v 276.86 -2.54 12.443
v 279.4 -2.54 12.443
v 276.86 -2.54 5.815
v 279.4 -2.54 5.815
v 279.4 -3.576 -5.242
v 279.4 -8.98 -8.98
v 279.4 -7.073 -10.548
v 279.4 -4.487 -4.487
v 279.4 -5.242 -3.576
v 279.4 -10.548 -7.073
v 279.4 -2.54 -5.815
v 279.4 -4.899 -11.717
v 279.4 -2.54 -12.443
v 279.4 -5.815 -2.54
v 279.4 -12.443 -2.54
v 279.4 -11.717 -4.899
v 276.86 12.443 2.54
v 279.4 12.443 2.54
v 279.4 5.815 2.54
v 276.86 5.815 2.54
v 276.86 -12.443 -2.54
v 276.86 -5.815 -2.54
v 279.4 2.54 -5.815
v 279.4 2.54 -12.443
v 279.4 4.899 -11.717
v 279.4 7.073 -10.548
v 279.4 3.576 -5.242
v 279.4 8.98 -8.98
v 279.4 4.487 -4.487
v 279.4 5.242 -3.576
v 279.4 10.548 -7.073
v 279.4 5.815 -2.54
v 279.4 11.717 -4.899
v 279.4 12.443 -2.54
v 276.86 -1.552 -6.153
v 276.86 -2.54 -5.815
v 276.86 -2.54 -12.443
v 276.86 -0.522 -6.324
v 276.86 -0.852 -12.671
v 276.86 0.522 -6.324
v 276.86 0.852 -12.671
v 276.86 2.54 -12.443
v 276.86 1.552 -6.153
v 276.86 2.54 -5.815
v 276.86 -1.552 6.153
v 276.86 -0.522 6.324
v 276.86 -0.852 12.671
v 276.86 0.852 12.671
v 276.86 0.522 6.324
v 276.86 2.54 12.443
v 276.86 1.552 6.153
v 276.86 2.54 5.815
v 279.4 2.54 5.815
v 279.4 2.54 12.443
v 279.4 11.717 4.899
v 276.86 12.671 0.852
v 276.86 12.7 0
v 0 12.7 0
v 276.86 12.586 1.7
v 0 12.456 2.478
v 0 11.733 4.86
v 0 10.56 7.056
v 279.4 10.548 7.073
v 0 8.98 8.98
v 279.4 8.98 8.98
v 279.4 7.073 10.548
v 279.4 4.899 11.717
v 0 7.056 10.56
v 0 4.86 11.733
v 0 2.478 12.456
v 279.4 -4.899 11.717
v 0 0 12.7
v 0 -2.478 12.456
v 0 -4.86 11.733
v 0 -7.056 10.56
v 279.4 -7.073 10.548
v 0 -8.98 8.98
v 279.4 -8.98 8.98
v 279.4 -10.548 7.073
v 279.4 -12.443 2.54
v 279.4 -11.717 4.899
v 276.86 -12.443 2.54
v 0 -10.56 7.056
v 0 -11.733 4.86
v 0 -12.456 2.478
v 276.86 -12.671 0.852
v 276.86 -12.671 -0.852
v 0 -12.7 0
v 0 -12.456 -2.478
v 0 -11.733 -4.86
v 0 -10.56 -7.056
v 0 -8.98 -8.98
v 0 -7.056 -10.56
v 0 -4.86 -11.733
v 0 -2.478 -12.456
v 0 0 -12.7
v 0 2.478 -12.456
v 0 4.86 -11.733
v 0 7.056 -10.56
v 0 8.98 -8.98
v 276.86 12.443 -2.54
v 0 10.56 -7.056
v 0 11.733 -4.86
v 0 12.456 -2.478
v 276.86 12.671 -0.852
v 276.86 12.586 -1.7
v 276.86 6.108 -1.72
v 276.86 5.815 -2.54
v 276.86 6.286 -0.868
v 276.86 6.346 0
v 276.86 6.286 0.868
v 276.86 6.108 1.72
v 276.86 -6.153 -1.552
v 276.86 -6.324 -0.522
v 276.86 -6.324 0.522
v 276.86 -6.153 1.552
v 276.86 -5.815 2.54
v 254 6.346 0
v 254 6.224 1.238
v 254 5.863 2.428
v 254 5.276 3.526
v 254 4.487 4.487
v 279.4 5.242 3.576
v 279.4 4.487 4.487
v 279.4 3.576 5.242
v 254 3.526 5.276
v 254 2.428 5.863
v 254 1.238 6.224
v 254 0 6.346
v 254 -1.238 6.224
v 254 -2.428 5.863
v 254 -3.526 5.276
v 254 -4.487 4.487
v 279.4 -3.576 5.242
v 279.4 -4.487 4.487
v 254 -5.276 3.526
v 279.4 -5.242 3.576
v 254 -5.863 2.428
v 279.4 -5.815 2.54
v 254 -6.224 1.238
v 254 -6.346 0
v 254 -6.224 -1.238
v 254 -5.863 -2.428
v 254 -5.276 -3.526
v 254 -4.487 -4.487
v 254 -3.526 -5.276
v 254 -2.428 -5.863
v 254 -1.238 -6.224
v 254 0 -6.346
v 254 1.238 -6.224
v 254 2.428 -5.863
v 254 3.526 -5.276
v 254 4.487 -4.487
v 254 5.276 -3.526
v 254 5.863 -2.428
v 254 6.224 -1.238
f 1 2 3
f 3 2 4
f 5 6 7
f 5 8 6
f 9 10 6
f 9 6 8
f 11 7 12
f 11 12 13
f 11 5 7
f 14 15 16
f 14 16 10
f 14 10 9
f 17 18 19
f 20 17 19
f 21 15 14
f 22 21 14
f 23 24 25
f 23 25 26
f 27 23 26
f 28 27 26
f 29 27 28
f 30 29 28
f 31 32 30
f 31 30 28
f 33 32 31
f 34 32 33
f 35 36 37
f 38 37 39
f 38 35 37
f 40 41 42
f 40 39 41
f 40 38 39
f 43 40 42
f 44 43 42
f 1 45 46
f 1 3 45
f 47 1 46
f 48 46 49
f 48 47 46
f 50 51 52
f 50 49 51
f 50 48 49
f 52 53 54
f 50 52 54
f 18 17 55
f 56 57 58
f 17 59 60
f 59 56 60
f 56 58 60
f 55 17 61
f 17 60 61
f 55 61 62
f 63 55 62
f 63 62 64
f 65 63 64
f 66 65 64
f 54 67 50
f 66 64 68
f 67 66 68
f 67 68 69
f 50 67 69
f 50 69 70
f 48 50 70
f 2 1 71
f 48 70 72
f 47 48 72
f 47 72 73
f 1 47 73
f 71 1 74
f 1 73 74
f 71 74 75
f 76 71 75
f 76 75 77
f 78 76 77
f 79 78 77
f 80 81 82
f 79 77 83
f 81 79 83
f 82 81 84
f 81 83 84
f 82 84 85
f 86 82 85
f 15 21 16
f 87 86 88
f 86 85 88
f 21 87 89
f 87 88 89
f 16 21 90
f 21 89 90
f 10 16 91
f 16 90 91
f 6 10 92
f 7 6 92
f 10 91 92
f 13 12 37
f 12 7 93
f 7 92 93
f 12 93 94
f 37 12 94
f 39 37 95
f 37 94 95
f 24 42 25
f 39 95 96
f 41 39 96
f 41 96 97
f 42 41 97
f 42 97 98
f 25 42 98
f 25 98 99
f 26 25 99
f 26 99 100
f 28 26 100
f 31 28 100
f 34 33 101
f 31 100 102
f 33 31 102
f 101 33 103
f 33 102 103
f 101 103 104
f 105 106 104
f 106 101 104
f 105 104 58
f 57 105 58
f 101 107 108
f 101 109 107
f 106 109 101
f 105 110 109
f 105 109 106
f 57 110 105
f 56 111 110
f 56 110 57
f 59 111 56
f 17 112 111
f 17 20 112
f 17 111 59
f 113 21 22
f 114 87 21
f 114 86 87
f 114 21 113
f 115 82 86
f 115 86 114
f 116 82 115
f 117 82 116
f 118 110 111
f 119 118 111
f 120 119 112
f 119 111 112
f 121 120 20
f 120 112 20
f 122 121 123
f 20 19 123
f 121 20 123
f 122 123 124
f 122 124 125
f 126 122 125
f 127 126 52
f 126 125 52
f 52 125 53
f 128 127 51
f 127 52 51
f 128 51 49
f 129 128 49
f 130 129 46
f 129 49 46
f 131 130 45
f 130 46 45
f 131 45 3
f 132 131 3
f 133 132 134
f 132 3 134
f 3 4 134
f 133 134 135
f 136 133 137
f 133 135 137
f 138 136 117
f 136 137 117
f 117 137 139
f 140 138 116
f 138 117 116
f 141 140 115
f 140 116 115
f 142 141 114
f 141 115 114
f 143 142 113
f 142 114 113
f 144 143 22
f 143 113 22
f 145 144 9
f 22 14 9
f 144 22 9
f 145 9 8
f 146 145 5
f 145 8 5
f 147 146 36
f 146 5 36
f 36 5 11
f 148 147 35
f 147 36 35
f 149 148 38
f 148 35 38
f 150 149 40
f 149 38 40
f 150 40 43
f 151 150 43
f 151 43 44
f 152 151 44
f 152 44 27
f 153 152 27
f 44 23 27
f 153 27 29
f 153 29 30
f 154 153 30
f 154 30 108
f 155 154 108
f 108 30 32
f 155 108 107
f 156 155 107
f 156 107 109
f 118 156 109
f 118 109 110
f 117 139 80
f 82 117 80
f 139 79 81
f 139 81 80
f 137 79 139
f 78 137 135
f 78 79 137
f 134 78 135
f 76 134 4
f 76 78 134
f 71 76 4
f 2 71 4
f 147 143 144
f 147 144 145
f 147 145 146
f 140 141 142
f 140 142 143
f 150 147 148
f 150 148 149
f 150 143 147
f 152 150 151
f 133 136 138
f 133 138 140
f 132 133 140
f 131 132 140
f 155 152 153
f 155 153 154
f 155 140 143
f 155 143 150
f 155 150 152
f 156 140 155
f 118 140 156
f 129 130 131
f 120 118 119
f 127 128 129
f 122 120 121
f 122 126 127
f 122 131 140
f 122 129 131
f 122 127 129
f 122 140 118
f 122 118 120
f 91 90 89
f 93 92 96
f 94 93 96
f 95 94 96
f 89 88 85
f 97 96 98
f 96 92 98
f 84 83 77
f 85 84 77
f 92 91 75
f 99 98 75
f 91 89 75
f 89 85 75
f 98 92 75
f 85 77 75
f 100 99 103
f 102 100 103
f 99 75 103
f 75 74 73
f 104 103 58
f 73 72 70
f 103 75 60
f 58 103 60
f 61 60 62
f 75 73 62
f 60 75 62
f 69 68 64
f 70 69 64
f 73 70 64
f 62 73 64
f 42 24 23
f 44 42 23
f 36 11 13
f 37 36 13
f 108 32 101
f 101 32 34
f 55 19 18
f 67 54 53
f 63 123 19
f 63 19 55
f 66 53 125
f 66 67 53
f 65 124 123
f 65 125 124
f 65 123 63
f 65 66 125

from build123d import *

# Parameters (mm, degrees)
F0_R     = 12.7
F1_DEPTH = 279.4
F3_DEPTH = 2.54
F4_R     = 6.345743
F5_DEPTH = 25.4


with BuildPart() as f1:
    # F0 (on Right) → F1 (new body)
    with BuildSketch(Plane.YZ):
        Circle(F0_R)
    extrude(amount=F1_DEPTH)

    # F2 (on face) → F3 (cut)
    with BuildSketch(Plane.YZ.offset(279.4)):
        with BuildLine():
            Line((17.428713, 2.54), (12.443408, 2.54))
            ThreePointArc((12.443408, 2.54), (12.635689, 1.276464), (12.7, 0))
            ThreePointArc((12.7, 0), (12.635689, -1.276464), (12.443408, -2.54))
            Line((12.443408, -2.54), (17.428713, -2.54))
            Line((17.428713, -2.54), (17.428713, 2.54))
        make_face()
        with BuildLine():
            ThreePointArc((-2.54, 12.443408), (0, 12.7), (2.54, 12.443408))
            Line((2.54, 12.443408), (2.54, 18.02417))
            Line((2.54, 18.02417), (-2.54, 18.02417))
            Line((-2.54, 18.02417), (-2.54, 12.443408))
        make_face()
        with BuildLine():
            ThreePointArc((-12.443408, -2.54), (-12.7, 0), (-12.443408, 2.54))
            Line((-12.443408, 2.54), (-17.28948, 2.54))
            Line((-17.28948, 2.54), (-17.28948, -2.54))
            Line((-17.28948, -2.54), (-12.443408, -2.54))
        make_face()
        with BuildLine():
            Line((2.54, -17.407856), (2.54, -12.443408))
            ThreePointArc((2.54, -12.443408), (0, -12.7), (-2.54, -12.443408))
            Line((-2.54, -12.443408), (-2.54, -17.407856))
            Line((-2.54, -17.407856), (2.54, -17.407856))
        make_face()
        with BuildLine():
            Line((12.443408, 2.54), (1.335046, 2.54))
            Line((1.335046, 2.54), (1.335046, -2.54))
            Line((1.335046, -2.54), (12.443408, -2.54))
            ThreePointArc((12.443408, -2.54), (12.635689, -1.276464), (12.7, 0))
            ThreePointArc((12.7, 0), (12.635689, 1.276464), (12.443408, 2.54))
        make_face()
        with BuildLine():
            Line((-2.623477, 2.54), (-12.443408, 2.54))
            ThreePointArc((-12.443408, 2.54), (-12.7, 0), (-12.443408, -2.54))
            Line((-12.443408, -2.54), (-2.623477, -2.54))
            Line((-2.623477, -2.54), (-2.623477, 2.54))
        make_face()
        with BuildLine():
            ThreePointArc((-2.54, -12.443408), (0, -12.7), (2.54, -12.443408))
            Line((2.54, -12.443408), (2.54, -3.909942))
            Line((2.54, -3.909942), (-2.54, -3.909942))
            Line((-2.54, -3.909942), (-2.54, -12.443408))
        make_face()
        with BuildLine():
            Line((2.54, 4.331574), (2.54, 12.443408))
            ThreePointArc((2.54, 12.443408), (0, 12.7), (-2.54, 12.443408))
            Line((-2.54, 12.443408), (-2.54, 4.331574))
            Line((-2.54, 4.331574), (2.54, 4.331574))
        make_face()
    extrude(amount=-F3_DEPTH, mode=Mode.SUBTRACT)

    # F4 (on face) → F5 (cut)
    with BuildSketch(Plane.YZ.offset(279.4)):
        Circle(F4_R)
    extrude(amount=-F5_DEPTH, mode=Mode.SUBTRACT)


solid = f1.part
